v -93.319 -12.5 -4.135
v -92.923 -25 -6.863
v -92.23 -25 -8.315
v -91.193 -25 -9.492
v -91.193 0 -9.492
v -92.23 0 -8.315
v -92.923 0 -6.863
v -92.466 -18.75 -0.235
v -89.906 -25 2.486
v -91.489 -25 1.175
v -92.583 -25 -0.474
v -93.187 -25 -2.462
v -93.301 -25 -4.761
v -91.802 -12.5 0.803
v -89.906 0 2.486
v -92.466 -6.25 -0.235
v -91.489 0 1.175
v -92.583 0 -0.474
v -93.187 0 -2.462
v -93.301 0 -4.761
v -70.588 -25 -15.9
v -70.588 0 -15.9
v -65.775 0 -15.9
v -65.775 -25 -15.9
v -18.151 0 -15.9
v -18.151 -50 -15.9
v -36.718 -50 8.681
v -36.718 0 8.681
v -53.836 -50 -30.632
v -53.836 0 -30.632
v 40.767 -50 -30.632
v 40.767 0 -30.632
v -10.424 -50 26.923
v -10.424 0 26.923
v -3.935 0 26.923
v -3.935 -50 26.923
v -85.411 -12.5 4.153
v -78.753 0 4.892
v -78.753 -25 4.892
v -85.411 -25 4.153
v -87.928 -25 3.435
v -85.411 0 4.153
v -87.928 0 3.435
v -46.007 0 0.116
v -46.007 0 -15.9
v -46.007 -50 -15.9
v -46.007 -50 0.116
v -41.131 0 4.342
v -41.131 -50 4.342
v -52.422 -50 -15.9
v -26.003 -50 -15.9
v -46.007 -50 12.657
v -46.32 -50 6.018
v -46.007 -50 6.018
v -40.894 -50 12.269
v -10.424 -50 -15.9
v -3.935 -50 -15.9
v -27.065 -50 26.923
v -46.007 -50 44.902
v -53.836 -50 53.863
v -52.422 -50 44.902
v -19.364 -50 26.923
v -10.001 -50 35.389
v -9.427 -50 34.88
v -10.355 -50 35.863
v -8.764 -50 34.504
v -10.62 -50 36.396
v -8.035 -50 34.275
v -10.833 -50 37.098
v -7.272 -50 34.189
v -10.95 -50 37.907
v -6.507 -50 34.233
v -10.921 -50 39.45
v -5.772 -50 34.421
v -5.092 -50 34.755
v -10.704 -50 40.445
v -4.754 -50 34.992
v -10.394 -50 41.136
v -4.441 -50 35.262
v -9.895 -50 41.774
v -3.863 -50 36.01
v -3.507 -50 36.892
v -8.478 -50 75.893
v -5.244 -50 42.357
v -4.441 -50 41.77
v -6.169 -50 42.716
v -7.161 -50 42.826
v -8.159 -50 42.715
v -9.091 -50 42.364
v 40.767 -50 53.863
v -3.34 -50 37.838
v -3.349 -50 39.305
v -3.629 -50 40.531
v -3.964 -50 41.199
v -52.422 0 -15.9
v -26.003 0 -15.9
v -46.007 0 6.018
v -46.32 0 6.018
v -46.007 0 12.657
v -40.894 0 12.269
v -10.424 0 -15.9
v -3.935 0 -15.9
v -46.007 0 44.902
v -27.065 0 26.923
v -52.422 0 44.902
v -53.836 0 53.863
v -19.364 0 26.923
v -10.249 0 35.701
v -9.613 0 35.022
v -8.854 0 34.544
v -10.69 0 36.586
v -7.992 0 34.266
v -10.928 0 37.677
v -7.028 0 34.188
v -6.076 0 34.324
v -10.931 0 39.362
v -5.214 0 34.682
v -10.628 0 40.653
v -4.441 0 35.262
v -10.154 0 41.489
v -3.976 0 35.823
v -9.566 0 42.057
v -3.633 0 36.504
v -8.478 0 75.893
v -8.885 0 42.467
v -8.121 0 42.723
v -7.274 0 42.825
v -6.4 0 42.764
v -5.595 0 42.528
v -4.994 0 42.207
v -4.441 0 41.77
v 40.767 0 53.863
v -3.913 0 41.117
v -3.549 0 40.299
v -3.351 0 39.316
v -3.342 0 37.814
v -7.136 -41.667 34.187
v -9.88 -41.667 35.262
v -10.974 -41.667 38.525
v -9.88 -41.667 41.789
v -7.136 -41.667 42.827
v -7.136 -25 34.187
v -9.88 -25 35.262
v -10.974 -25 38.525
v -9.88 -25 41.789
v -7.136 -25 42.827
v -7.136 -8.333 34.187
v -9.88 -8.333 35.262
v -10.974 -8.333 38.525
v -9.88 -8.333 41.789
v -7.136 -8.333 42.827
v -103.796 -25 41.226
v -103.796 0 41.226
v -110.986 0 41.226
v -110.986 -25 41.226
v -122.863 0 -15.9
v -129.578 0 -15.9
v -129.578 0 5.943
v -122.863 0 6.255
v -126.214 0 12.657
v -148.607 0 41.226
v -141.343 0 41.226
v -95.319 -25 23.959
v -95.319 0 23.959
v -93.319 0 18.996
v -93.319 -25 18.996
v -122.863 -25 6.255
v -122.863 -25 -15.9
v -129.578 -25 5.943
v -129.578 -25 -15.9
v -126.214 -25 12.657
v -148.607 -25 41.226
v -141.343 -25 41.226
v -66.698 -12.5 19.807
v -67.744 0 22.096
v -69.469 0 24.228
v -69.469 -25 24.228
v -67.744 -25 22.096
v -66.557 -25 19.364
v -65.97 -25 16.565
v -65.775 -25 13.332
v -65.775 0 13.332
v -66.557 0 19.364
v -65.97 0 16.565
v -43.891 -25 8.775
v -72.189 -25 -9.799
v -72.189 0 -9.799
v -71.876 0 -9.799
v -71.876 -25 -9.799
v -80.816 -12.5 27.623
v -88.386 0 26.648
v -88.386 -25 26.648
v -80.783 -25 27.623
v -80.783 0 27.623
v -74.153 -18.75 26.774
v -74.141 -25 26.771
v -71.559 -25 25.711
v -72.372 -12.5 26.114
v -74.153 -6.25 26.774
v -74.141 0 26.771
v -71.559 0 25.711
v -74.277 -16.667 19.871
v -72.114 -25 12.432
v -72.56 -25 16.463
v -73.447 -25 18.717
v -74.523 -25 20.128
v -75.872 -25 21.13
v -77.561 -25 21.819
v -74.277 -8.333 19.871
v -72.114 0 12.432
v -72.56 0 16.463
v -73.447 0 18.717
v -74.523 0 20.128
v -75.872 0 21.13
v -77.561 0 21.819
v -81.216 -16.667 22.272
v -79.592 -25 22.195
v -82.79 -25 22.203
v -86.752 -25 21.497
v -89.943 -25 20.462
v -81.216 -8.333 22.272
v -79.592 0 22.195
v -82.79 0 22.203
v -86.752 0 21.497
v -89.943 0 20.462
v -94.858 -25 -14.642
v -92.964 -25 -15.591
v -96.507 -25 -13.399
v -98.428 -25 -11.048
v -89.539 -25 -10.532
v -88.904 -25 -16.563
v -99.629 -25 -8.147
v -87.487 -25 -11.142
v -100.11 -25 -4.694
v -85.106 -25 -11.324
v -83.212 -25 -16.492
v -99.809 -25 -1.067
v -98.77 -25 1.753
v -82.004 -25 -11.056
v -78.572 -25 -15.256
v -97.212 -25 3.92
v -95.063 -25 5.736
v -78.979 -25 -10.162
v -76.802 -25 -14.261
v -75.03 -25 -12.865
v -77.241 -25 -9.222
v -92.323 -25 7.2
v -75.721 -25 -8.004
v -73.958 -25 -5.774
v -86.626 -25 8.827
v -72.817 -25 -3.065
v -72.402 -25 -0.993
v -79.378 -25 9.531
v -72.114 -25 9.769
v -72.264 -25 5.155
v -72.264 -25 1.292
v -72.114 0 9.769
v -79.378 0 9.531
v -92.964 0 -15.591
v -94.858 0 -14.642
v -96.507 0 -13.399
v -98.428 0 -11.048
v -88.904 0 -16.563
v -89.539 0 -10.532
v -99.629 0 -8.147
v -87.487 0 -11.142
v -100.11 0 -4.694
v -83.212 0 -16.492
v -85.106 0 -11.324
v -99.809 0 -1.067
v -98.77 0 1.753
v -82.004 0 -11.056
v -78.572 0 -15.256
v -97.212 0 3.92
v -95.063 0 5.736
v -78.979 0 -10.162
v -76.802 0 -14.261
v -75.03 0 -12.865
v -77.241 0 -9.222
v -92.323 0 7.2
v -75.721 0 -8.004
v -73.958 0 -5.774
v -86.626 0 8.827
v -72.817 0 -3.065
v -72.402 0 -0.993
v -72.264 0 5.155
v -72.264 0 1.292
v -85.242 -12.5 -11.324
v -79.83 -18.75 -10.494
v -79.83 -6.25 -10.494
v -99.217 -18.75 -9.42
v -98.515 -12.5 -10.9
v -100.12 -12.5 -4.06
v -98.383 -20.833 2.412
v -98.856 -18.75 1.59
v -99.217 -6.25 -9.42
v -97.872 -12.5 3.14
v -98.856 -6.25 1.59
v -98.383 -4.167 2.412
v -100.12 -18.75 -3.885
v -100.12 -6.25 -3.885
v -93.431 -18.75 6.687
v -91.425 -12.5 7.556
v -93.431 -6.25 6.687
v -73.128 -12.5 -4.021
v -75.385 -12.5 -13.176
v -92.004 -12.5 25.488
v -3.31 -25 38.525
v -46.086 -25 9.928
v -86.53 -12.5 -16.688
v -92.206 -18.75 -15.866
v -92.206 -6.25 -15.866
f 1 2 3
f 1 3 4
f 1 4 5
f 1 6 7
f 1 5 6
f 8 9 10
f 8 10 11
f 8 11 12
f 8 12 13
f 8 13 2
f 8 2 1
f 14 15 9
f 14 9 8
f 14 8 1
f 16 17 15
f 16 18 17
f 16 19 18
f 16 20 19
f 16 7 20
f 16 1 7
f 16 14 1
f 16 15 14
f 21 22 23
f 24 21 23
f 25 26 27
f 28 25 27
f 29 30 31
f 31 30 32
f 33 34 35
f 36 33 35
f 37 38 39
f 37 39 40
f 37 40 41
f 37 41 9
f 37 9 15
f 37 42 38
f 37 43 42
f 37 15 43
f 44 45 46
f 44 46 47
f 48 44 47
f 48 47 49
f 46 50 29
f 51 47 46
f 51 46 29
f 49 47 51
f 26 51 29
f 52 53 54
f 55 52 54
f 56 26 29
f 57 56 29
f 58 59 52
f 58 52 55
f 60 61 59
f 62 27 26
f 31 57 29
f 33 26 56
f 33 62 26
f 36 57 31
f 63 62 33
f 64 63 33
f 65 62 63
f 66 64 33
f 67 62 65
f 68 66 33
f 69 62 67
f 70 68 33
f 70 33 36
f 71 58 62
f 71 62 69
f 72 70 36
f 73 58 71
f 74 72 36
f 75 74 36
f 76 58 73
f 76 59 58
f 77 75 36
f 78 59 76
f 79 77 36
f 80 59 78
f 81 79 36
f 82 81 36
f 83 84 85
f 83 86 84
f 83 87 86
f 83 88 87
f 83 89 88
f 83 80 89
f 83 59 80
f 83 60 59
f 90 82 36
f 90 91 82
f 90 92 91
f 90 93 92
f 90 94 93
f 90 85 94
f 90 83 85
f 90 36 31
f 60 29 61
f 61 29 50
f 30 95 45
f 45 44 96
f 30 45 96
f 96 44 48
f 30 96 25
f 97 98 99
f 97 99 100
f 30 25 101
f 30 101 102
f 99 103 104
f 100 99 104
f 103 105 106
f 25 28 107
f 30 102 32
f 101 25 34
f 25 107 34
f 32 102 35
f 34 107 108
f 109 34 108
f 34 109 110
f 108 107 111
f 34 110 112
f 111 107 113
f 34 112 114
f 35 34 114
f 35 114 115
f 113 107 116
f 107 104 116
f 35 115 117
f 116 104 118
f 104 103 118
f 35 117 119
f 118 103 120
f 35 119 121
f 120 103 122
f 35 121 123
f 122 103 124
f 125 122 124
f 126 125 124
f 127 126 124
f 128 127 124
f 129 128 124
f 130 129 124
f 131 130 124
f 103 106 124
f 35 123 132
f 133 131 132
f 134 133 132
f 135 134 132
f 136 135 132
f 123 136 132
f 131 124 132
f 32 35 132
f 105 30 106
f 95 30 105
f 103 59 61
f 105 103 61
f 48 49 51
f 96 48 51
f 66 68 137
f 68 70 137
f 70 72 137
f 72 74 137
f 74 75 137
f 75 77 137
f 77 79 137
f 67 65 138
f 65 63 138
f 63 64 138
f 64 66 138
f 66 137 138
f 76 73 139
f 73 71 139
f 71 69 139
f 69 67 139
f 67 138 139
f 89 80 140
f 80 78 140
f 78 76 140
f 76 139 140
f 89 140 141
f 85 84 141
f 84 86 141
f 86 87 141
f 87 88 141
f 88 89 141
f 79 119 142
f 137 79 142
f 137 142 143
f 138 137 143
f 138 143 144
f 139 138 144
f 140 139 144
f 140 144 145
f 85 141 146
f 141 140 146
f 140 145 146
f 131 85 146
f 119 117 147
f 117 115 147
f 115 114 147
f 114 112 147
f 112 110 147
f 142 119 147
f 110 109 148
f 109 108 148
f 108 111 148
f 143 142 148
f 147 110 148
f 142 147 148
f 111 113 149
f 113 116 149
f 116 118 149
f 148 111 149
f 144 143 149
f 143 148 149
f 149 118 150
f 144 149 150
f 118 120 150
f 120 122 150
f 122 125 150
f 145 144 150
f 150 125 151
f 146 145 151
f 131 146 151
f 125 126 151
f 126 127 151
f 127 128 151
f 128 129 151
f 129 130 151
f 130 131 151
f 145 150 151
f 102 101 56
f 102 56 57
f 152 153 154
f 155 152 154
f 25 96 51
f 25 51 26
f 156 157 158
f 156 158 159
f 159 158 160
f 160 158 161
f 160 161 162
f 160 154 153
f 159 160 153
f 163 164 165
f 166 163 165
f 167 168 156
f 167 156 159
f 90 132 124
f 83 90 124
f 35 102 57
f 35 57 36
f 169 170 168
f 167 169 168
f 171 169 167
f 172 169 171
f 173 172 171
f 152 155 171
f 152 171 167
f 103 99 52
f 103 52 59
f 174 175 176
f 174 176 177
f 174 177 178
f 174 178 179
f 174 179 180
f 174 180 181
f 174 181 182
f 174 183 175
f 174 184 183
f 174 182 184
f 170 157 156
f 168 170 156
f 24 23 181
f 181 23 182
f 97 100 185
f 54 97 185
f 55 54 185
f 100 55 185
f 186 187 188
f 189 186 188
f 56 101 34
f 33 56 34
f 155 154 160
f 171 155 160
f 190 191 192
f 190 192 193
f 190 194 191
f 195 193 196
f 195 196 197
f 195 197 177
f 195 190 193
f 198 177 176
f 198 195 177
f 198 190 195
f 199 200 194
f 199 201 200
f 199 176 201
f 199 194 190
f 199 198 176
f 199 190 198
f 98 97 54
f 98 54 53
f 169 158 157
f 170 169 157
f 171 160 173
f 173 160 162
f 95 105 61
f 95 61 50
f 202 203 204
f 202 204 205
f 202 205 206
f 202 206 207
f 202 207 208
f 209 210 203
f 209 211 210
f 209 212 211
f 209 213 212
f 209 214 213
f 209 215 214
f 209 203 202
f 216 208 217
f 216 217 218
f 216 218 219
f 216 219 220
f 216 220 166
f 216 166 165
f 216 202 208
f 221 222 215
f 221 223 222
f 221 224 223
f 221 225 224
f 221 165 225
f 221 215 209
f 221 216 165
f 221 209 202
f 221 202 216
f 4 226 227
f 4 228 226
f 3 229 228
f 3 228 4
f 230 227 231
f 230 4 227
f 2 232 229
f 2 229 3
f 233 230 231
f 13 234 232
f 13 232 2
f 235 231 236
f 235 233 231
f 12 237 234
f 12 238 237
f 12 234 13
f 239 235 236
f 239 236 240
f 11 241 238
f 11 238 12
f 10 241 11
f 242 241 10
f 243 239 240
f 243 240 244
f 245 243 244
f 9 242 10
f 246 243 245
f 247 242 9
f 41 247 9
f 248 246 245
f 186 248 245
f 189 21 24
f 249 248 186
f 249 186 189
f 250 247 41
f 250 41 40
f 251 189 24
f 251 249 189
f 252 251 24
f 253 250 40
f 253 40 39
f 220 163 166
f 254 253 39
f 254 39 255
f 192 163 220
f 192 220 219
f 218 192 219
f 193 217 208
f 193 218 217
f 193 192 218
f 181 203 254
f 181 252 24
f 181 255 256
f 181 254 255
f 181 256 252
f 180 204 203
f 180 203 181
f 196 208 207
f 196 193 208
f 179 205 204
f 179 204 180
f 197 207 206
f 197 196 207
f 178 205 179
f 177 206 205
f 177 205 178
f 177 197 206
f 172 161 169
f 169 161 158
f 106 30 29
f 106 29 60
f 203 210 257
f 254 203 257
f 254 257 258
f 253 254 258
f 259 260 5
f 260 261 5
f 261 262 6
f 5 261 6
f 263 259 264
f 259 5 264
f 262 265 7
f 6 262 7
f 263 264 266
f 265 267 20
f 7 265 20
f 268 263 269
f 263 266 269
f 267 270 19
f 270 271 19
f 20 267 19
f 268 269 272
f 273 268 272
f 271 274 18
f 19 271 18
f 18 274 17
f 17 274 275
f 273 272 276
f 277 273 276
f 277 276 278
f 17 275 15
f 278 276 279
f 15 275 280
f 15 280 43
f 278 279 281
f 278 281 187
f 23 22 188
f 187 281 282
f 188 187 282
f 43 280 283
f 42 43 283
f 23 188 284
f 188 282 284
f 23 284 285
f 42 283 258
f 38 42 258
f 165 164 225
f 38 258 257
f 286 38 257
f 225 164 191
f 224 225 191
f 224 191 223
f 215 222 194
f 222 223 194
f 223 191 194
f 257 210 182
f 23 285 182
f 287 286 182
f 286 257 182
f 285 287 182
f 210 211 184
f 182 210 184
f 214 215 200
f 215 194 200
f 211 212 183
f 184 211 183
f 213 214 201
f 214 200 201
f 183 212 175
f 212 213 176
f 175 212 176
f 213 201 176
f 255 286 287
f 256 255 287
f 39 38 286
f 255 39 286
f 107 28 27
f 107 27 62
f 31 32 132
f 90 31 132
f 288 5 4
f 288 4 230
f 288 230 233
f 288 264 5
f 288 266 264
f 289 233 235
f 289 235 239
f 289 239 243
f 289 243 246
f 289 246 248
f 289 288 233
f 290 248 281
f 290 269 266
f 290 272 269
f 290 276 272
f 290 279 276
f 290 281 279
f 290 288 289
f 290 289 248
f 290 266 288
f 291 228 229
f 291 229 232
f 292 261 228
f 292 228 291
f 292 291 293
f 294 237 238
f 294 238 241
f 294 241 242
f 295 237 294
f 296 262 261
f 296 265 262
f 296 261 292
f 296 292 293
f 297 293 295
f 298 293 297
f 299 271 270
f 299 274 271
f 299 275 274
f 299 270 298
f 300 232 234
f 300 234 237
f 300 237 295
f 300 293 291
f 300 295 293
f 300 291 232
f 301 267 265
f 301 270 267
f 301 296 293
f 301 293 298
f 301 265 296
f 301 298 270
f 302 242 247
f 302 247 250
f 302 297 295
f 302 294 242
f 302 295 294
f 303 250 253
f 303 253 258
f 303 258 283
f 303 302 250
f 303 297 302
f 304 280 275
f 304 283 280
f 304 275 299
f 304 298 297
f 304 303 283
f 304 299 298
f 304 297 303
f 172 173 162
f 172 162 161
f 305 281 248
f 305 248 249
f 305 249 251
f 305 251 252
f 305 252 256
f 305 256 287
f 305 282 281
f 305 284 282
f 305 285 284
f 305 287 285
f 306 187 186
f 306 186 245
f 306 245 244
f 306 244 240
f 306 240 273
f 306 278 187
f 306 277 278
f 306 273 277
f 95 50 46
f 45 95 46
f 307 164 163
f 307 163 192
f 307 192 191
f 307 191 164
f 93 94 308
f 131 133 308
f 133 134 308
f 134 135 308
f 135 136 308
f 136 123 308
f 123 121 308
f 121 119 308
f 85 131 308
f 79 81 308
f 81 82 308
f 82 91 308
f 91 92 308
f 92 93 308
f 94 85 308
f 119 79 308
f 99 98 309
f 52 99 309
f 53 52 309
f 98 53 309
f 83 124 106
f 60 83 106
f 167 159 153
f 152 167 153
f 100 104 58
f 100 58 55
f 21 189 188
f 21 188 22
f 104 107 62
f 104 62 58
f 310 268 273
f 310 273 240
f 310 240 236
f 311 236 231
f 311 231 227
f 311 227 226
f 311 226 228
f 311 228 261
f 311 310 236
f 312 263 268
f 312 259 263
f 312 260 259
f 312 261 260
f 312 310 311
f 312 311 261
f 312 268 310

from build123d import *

# Parameters (mm, degrees)
F0_W     = 94.6031436324
F0_H     = 84.4948608428
F1_DEPTH = 50
F3_DEPTH = 25
F2_W     = 6.4890577899
F2_H     = 42.8227802129
F4_DEPTH = 50.001


with BuildPart() as f1:
    # F0 (on Front) → F1 (new body)
    with BuildSketch(Plane.XZ):
        with Locations((-6.5345913172, 11.6150705144)):
            Rectangle(F0_W, F0_H)
        Polygon((-8.4784915671, 75.8933722973), (-53.8361631334, 53.8625009358), (40.766980499, 53.8625009358), align=None)
    extrude(amount=F1_DEPTH)

    # F2 (on Front) → F4 (cut, through all)
    with BuildSketch(Plane.XZ):
        with Locations((-7.1794033004, 5.5112923191)):
            Rectangle(F2_W, F2_H)
        with BuildLine():
            add(Edge.make_bspline(
                [(-10.9740642624, 38.5254678379), (-10.9740642624, 40.7510021089), (-9.8800516292, 41.7887512352)],
                knots=[0, 0, 0, 1, 1, 1], degree=2))
            add(Edge.make_bspline(
                [(-9.8800516292, 35.2621844407), (-10.9740642624, 36.3374425716), (-10.9740642624, 38.5254678379)],
                knots=[0, 0, 0, 1, 1, 1], degree=2))
            add(Edge.make_bspline(
                [(-7.1356427951, 34.1869263098), (-8.786038996, 34.1869263098), (-9.8800516292, 35.2621844407)],
                knots=[0, 0, 0, 1, 1, 1], degree=2))
            add(Edge.make_bspline(
                [(-4.4412459671, 35.2621844407), (-5.5727676049, 34.1869263098), (-7.1356427951, 34.1869263098)],
                knots=[0, 0, 0, 1, 1, 1], degree=2))
            add(Edge.make_bspline(
                [(-3.3097243294, 38.5254678379), (-3.3097243294, 36.3374425716), (-4.4412459671, 35.2621844407)],
                knots=[0, 0, 0, 1, 1, 1], degree=2))
            add(Edge.make_bspline(
                [(-4.4412459671, 41.7699967329), (-3.3097243294, 40.7134931043), (-3.3097243294, 38.5254678379)],
                knots=[0, 0, 0, 1, 1, 1], degree=2))
            add(Edge.make_bspline(
                [(-7.1356427951, 42.8265003615), (-5.5727676049, 42.8265003615), (-4.4412459671, 41.7699967329)],
                knots=[0, 0, 0, 1, 1, 1], degree=2))
            add(Edge.make_bspline(
                [(-9.8800516292, 41.7887512352), (-8.786038996, 42.8265003615), (-7.1356427951, 42.8265003615)],
                knots=[0, 0, 0, 1, 1, 1], degree=2))
        make_face()
        with BuildLine():
            add(Edge.make_bspline(
                [(-46.0074745271, 6.0176638807), (-44.3320723231, 8.4057371714), (-40.8937469046, 12.2691646417)],
                knots=[0, 0, 0, 1, 1, 1], degree=2))
            Line((-46.0074745271, 6.0176638807), (-46.3200495651, 6.0176638807))
            add(Edge.make_bspline(
                [(-46.0074745271, 12.6567576889), (-46.0074745271, 10.5187444286), (-46.3200495651, 6.0176638807)],
                knots=[0, 0, 0, 1, 1, 1], degree=2))
            Line((-46.0074745271, 12.6567576889), (-46.0074745271, 44.9019986142))
            Line((-46.0074745271, 44.9019986142), (-52.4215143079, 44.9019986142))
            Line((-52.4215143079, 44.9019986142), (-52.4215143079, -15.9000977874))
            Line((-52.4215143079, -15.9000977874), (-46.0074745271, -15.9000977874))
            Line((-46.0074745271, -15.9000977874), (-46.0074745271, 0.1162471623))
            Line((-46.0074745271, 0.1162471623), (-41.1313039335, 4.3422616768))
            Line((-41.1313039335, 4.3422616768), (-26.0026720918, -15.9000977874))
            Line((-26.0026720918, -15.9000977874), (-18.150787136, -15.9000977874))
            Line((-18.150787136, -15.9000977874), (-36.7177443962, 8.6808032049))
            Line((-36.7177443962, 8.6808032049), (-19.3635782836, 26.9226824255))
            Line((-19.3635782836, 26.9226824255), (-27.0654272212, 26.9226824255))
            Line((-27.0654272212, 26.9226824255), (-40.8937469046, 12.2691646417))
        make_face()
    extrude(amount=F4_DEPTH, mode=Mode.SUBTRACT)


with BuildPart() as f3:
    # F2 (on Front) → F3 (new body)
    with BuildSketch(Plane.XZ):
        Polygon((-110.985573437, 41.2261161667), (-126.2142292908, 12.6567576889), (-141.3428611324, 41.2261161667), (-148.6071050167, 41.2261161667), (-129.5775367002, 5.9426458716), (-129.5775367002, -15.9000977874), (-122.8634248829, -15.9000977874), (-122.8634248829, 6.2552209096), (-103.7963475618, 41.2261161667), align=None)
        with BuildLine():
            Line((-71.8761846761, -9.7986330446), (-70.5883755193, -15.9000977874))
            Line((-70.5883755193, -15.9000977874), (-65.7747199334, -15.9000977874))
            Line((-65.7747199334, -15.9000977874), (-65.7747199334, 13.3319197711))
            add(Edge.make_bspline(
                [(-69.4693568831, 24.2282855975), (-65.7747199334, 20.8337206843), (-65.7747199334, 13.3319197711)],
                knots=[0, 0, 0, 1, 1, 1], degree=2))
            add(Edge.make_bspline(
                [(-80.8158307643, 27.6228505108), (-73.1639938329, 27.6228505108), (-69.4693568831, 24.2282855975)],
                knots=[0, 0, 0, 1, 1, 1], degree=2))
            add(Edge.make_bspline(
                [(-88.3863981859, 26.647616392), (-84.616743227, 27.6228505108), (-80.8158307643, 27.6228505108)],
                knots=[0, 0, 0, 1, 1, 1], degree=2))
            add(Edge.make_bspline(
                [(-95.3193125299, 23.9594710648), (-92.1560531448, 25.6723822733), (-88.3863981859, 26.647616392)],
                knots=[0, 0, 0, 1, 1, 1], degree=2))
            Line((-95.3193125299, 23.9594710648), (-93.3188322864, 18.9957794606))
            add(Edge.make_bspline(
                [(-81.2159268131, 22.2715658593), (-86.5672114645, 22.2715658593), (-93.3188322864, 18.9957794606)],
                knots=[0, 0, 0, 1, 1, 1], degree=2))
            add(Edge.make_bspline(
                [(-74.2767609683, 19.8709895671), (-76.4397802316, 22.2715658593), (-81.2159268131, 22.2715658593)],
                knots=[0, 0, 0, 1, 1, 1], degree=2))
            add(Edge.make_bspline(
                [(-72.113741705, 12.4317036615), (-72.113741705, 17.4704132749), (-74.2767609683, 19.8709895671)],
                knots=[0, 0, 0, 1, 1, 1], degree=2))
            Line((-72.113741705, 12.4317036615), (-72.113741705, 9.7685643373))
            Line((-72.113741705, 9.7685643373), (-79.3779855893, 9.5310073084))
            add(Edge.make_bspline(
                [(-100.1204651143, -4.059755346), (-100.1204651143, 8.9058572323), (-79.3779855893, 9.5310073084)],
                knots=[0, 0, 0, 1, 1, 1], degree=2))
            add(Edge.make_bspline(
                [(-96.5070976745, -13.399497483), (-100.1204651143, -10.1112080827), (-100.1204651143, -4.059755346)],
                knots=[0, 0, 0, 1, 1, 1], degree=2))
            add(Edge.make_bspline(
                [(-86.5297024599, -16.6877868833), (-92.8937302346, -16.6877868833), (-96.5070976745, -13.399497483)],
                knots=[0, 0, 0, 1, 1, 1], degree=2))
            add(Edge.make_bspline(
                [(-78.5715419911, -15.256193209), (-81.7535558785, -16.6877868833), (-86.5297024599, -16.6877868833)],
                knots=[0, 0, 0, 1, 1, 1], degree=2))
            add(Edge.make_bspline(
                [(-72.1887597142, -9.7986330446), (-75.3895281038, -13.8245995347), (-78.5715419911, -15.256193209)],
                knots=[0, 0, 0, 1, 1, 1], degree=2))
            Line((-72.1887597142, -9.7986330446), (-71.8761846761, -9.7986330446))
        make_face()
        with BuildLine():
            add(Edge.make_bspline(
                [(-85.2418933031, -11.3239992303), (-79.177937565, -11.3239992303), (-75.7208576441, -8.0044523262)],
                knots=[0, 0, 0, 1, 1, 1], degree=2))
            add(Edge.make_bspline(
                [(-91.1933220276, -9.4923095073), (-89.0678117689, -11.3239992303), (-85.2418933031, -11.3239992303)],
                knots=[0, 0, 0, 1, 1, 1], degree=2))
            add(Edge.make_bspline(
                [(-93.3188322864, -4.1347733552), (-93.3188322864, -7.6606197844), (-91.1933220276, -9.4923095073)],
                knots=[0, 0, 0, 1, 1, 1], degree=2))
            add(Edge.make_bspline(
                [(-89.9055128709, 2.4855659507), (-93.3188322864, 0.3538041912), (-93.3188322864, -4.1347733552)],
                knots=[0, 0, 0, 1, 1, 1], degree=2))
            add(Edge.make_bspline(
                [(-78.7528355132, 4.8923937437), (-86.4921934553, 4.6173277102), (-89.9055128709, 2.4855659507)],
                knots=[0, 0, 0, 1, 1, 1], degree=2))
            Line((-78.7528355132, 4.8923937437), (-72.2637777233, 5.1549567757))
            Line((-72.2637777233, 5.1549567757), (-72.2637777233, 1.2915293054))
            add(Edge.make_bspline(
                [(-75.7208576441, -8.0044523262), (-72.2637777233, -4.6849054221), (-72.2637777233, 1.2915293054)],
                knots=[0, 0, 0, 1, 1, 1], degree=2))
        make_face(mode=Mode.SUBTRACT)
    extrude(amount=F3_DEPTH)


solid = Compound([f1.part, f3.part])
